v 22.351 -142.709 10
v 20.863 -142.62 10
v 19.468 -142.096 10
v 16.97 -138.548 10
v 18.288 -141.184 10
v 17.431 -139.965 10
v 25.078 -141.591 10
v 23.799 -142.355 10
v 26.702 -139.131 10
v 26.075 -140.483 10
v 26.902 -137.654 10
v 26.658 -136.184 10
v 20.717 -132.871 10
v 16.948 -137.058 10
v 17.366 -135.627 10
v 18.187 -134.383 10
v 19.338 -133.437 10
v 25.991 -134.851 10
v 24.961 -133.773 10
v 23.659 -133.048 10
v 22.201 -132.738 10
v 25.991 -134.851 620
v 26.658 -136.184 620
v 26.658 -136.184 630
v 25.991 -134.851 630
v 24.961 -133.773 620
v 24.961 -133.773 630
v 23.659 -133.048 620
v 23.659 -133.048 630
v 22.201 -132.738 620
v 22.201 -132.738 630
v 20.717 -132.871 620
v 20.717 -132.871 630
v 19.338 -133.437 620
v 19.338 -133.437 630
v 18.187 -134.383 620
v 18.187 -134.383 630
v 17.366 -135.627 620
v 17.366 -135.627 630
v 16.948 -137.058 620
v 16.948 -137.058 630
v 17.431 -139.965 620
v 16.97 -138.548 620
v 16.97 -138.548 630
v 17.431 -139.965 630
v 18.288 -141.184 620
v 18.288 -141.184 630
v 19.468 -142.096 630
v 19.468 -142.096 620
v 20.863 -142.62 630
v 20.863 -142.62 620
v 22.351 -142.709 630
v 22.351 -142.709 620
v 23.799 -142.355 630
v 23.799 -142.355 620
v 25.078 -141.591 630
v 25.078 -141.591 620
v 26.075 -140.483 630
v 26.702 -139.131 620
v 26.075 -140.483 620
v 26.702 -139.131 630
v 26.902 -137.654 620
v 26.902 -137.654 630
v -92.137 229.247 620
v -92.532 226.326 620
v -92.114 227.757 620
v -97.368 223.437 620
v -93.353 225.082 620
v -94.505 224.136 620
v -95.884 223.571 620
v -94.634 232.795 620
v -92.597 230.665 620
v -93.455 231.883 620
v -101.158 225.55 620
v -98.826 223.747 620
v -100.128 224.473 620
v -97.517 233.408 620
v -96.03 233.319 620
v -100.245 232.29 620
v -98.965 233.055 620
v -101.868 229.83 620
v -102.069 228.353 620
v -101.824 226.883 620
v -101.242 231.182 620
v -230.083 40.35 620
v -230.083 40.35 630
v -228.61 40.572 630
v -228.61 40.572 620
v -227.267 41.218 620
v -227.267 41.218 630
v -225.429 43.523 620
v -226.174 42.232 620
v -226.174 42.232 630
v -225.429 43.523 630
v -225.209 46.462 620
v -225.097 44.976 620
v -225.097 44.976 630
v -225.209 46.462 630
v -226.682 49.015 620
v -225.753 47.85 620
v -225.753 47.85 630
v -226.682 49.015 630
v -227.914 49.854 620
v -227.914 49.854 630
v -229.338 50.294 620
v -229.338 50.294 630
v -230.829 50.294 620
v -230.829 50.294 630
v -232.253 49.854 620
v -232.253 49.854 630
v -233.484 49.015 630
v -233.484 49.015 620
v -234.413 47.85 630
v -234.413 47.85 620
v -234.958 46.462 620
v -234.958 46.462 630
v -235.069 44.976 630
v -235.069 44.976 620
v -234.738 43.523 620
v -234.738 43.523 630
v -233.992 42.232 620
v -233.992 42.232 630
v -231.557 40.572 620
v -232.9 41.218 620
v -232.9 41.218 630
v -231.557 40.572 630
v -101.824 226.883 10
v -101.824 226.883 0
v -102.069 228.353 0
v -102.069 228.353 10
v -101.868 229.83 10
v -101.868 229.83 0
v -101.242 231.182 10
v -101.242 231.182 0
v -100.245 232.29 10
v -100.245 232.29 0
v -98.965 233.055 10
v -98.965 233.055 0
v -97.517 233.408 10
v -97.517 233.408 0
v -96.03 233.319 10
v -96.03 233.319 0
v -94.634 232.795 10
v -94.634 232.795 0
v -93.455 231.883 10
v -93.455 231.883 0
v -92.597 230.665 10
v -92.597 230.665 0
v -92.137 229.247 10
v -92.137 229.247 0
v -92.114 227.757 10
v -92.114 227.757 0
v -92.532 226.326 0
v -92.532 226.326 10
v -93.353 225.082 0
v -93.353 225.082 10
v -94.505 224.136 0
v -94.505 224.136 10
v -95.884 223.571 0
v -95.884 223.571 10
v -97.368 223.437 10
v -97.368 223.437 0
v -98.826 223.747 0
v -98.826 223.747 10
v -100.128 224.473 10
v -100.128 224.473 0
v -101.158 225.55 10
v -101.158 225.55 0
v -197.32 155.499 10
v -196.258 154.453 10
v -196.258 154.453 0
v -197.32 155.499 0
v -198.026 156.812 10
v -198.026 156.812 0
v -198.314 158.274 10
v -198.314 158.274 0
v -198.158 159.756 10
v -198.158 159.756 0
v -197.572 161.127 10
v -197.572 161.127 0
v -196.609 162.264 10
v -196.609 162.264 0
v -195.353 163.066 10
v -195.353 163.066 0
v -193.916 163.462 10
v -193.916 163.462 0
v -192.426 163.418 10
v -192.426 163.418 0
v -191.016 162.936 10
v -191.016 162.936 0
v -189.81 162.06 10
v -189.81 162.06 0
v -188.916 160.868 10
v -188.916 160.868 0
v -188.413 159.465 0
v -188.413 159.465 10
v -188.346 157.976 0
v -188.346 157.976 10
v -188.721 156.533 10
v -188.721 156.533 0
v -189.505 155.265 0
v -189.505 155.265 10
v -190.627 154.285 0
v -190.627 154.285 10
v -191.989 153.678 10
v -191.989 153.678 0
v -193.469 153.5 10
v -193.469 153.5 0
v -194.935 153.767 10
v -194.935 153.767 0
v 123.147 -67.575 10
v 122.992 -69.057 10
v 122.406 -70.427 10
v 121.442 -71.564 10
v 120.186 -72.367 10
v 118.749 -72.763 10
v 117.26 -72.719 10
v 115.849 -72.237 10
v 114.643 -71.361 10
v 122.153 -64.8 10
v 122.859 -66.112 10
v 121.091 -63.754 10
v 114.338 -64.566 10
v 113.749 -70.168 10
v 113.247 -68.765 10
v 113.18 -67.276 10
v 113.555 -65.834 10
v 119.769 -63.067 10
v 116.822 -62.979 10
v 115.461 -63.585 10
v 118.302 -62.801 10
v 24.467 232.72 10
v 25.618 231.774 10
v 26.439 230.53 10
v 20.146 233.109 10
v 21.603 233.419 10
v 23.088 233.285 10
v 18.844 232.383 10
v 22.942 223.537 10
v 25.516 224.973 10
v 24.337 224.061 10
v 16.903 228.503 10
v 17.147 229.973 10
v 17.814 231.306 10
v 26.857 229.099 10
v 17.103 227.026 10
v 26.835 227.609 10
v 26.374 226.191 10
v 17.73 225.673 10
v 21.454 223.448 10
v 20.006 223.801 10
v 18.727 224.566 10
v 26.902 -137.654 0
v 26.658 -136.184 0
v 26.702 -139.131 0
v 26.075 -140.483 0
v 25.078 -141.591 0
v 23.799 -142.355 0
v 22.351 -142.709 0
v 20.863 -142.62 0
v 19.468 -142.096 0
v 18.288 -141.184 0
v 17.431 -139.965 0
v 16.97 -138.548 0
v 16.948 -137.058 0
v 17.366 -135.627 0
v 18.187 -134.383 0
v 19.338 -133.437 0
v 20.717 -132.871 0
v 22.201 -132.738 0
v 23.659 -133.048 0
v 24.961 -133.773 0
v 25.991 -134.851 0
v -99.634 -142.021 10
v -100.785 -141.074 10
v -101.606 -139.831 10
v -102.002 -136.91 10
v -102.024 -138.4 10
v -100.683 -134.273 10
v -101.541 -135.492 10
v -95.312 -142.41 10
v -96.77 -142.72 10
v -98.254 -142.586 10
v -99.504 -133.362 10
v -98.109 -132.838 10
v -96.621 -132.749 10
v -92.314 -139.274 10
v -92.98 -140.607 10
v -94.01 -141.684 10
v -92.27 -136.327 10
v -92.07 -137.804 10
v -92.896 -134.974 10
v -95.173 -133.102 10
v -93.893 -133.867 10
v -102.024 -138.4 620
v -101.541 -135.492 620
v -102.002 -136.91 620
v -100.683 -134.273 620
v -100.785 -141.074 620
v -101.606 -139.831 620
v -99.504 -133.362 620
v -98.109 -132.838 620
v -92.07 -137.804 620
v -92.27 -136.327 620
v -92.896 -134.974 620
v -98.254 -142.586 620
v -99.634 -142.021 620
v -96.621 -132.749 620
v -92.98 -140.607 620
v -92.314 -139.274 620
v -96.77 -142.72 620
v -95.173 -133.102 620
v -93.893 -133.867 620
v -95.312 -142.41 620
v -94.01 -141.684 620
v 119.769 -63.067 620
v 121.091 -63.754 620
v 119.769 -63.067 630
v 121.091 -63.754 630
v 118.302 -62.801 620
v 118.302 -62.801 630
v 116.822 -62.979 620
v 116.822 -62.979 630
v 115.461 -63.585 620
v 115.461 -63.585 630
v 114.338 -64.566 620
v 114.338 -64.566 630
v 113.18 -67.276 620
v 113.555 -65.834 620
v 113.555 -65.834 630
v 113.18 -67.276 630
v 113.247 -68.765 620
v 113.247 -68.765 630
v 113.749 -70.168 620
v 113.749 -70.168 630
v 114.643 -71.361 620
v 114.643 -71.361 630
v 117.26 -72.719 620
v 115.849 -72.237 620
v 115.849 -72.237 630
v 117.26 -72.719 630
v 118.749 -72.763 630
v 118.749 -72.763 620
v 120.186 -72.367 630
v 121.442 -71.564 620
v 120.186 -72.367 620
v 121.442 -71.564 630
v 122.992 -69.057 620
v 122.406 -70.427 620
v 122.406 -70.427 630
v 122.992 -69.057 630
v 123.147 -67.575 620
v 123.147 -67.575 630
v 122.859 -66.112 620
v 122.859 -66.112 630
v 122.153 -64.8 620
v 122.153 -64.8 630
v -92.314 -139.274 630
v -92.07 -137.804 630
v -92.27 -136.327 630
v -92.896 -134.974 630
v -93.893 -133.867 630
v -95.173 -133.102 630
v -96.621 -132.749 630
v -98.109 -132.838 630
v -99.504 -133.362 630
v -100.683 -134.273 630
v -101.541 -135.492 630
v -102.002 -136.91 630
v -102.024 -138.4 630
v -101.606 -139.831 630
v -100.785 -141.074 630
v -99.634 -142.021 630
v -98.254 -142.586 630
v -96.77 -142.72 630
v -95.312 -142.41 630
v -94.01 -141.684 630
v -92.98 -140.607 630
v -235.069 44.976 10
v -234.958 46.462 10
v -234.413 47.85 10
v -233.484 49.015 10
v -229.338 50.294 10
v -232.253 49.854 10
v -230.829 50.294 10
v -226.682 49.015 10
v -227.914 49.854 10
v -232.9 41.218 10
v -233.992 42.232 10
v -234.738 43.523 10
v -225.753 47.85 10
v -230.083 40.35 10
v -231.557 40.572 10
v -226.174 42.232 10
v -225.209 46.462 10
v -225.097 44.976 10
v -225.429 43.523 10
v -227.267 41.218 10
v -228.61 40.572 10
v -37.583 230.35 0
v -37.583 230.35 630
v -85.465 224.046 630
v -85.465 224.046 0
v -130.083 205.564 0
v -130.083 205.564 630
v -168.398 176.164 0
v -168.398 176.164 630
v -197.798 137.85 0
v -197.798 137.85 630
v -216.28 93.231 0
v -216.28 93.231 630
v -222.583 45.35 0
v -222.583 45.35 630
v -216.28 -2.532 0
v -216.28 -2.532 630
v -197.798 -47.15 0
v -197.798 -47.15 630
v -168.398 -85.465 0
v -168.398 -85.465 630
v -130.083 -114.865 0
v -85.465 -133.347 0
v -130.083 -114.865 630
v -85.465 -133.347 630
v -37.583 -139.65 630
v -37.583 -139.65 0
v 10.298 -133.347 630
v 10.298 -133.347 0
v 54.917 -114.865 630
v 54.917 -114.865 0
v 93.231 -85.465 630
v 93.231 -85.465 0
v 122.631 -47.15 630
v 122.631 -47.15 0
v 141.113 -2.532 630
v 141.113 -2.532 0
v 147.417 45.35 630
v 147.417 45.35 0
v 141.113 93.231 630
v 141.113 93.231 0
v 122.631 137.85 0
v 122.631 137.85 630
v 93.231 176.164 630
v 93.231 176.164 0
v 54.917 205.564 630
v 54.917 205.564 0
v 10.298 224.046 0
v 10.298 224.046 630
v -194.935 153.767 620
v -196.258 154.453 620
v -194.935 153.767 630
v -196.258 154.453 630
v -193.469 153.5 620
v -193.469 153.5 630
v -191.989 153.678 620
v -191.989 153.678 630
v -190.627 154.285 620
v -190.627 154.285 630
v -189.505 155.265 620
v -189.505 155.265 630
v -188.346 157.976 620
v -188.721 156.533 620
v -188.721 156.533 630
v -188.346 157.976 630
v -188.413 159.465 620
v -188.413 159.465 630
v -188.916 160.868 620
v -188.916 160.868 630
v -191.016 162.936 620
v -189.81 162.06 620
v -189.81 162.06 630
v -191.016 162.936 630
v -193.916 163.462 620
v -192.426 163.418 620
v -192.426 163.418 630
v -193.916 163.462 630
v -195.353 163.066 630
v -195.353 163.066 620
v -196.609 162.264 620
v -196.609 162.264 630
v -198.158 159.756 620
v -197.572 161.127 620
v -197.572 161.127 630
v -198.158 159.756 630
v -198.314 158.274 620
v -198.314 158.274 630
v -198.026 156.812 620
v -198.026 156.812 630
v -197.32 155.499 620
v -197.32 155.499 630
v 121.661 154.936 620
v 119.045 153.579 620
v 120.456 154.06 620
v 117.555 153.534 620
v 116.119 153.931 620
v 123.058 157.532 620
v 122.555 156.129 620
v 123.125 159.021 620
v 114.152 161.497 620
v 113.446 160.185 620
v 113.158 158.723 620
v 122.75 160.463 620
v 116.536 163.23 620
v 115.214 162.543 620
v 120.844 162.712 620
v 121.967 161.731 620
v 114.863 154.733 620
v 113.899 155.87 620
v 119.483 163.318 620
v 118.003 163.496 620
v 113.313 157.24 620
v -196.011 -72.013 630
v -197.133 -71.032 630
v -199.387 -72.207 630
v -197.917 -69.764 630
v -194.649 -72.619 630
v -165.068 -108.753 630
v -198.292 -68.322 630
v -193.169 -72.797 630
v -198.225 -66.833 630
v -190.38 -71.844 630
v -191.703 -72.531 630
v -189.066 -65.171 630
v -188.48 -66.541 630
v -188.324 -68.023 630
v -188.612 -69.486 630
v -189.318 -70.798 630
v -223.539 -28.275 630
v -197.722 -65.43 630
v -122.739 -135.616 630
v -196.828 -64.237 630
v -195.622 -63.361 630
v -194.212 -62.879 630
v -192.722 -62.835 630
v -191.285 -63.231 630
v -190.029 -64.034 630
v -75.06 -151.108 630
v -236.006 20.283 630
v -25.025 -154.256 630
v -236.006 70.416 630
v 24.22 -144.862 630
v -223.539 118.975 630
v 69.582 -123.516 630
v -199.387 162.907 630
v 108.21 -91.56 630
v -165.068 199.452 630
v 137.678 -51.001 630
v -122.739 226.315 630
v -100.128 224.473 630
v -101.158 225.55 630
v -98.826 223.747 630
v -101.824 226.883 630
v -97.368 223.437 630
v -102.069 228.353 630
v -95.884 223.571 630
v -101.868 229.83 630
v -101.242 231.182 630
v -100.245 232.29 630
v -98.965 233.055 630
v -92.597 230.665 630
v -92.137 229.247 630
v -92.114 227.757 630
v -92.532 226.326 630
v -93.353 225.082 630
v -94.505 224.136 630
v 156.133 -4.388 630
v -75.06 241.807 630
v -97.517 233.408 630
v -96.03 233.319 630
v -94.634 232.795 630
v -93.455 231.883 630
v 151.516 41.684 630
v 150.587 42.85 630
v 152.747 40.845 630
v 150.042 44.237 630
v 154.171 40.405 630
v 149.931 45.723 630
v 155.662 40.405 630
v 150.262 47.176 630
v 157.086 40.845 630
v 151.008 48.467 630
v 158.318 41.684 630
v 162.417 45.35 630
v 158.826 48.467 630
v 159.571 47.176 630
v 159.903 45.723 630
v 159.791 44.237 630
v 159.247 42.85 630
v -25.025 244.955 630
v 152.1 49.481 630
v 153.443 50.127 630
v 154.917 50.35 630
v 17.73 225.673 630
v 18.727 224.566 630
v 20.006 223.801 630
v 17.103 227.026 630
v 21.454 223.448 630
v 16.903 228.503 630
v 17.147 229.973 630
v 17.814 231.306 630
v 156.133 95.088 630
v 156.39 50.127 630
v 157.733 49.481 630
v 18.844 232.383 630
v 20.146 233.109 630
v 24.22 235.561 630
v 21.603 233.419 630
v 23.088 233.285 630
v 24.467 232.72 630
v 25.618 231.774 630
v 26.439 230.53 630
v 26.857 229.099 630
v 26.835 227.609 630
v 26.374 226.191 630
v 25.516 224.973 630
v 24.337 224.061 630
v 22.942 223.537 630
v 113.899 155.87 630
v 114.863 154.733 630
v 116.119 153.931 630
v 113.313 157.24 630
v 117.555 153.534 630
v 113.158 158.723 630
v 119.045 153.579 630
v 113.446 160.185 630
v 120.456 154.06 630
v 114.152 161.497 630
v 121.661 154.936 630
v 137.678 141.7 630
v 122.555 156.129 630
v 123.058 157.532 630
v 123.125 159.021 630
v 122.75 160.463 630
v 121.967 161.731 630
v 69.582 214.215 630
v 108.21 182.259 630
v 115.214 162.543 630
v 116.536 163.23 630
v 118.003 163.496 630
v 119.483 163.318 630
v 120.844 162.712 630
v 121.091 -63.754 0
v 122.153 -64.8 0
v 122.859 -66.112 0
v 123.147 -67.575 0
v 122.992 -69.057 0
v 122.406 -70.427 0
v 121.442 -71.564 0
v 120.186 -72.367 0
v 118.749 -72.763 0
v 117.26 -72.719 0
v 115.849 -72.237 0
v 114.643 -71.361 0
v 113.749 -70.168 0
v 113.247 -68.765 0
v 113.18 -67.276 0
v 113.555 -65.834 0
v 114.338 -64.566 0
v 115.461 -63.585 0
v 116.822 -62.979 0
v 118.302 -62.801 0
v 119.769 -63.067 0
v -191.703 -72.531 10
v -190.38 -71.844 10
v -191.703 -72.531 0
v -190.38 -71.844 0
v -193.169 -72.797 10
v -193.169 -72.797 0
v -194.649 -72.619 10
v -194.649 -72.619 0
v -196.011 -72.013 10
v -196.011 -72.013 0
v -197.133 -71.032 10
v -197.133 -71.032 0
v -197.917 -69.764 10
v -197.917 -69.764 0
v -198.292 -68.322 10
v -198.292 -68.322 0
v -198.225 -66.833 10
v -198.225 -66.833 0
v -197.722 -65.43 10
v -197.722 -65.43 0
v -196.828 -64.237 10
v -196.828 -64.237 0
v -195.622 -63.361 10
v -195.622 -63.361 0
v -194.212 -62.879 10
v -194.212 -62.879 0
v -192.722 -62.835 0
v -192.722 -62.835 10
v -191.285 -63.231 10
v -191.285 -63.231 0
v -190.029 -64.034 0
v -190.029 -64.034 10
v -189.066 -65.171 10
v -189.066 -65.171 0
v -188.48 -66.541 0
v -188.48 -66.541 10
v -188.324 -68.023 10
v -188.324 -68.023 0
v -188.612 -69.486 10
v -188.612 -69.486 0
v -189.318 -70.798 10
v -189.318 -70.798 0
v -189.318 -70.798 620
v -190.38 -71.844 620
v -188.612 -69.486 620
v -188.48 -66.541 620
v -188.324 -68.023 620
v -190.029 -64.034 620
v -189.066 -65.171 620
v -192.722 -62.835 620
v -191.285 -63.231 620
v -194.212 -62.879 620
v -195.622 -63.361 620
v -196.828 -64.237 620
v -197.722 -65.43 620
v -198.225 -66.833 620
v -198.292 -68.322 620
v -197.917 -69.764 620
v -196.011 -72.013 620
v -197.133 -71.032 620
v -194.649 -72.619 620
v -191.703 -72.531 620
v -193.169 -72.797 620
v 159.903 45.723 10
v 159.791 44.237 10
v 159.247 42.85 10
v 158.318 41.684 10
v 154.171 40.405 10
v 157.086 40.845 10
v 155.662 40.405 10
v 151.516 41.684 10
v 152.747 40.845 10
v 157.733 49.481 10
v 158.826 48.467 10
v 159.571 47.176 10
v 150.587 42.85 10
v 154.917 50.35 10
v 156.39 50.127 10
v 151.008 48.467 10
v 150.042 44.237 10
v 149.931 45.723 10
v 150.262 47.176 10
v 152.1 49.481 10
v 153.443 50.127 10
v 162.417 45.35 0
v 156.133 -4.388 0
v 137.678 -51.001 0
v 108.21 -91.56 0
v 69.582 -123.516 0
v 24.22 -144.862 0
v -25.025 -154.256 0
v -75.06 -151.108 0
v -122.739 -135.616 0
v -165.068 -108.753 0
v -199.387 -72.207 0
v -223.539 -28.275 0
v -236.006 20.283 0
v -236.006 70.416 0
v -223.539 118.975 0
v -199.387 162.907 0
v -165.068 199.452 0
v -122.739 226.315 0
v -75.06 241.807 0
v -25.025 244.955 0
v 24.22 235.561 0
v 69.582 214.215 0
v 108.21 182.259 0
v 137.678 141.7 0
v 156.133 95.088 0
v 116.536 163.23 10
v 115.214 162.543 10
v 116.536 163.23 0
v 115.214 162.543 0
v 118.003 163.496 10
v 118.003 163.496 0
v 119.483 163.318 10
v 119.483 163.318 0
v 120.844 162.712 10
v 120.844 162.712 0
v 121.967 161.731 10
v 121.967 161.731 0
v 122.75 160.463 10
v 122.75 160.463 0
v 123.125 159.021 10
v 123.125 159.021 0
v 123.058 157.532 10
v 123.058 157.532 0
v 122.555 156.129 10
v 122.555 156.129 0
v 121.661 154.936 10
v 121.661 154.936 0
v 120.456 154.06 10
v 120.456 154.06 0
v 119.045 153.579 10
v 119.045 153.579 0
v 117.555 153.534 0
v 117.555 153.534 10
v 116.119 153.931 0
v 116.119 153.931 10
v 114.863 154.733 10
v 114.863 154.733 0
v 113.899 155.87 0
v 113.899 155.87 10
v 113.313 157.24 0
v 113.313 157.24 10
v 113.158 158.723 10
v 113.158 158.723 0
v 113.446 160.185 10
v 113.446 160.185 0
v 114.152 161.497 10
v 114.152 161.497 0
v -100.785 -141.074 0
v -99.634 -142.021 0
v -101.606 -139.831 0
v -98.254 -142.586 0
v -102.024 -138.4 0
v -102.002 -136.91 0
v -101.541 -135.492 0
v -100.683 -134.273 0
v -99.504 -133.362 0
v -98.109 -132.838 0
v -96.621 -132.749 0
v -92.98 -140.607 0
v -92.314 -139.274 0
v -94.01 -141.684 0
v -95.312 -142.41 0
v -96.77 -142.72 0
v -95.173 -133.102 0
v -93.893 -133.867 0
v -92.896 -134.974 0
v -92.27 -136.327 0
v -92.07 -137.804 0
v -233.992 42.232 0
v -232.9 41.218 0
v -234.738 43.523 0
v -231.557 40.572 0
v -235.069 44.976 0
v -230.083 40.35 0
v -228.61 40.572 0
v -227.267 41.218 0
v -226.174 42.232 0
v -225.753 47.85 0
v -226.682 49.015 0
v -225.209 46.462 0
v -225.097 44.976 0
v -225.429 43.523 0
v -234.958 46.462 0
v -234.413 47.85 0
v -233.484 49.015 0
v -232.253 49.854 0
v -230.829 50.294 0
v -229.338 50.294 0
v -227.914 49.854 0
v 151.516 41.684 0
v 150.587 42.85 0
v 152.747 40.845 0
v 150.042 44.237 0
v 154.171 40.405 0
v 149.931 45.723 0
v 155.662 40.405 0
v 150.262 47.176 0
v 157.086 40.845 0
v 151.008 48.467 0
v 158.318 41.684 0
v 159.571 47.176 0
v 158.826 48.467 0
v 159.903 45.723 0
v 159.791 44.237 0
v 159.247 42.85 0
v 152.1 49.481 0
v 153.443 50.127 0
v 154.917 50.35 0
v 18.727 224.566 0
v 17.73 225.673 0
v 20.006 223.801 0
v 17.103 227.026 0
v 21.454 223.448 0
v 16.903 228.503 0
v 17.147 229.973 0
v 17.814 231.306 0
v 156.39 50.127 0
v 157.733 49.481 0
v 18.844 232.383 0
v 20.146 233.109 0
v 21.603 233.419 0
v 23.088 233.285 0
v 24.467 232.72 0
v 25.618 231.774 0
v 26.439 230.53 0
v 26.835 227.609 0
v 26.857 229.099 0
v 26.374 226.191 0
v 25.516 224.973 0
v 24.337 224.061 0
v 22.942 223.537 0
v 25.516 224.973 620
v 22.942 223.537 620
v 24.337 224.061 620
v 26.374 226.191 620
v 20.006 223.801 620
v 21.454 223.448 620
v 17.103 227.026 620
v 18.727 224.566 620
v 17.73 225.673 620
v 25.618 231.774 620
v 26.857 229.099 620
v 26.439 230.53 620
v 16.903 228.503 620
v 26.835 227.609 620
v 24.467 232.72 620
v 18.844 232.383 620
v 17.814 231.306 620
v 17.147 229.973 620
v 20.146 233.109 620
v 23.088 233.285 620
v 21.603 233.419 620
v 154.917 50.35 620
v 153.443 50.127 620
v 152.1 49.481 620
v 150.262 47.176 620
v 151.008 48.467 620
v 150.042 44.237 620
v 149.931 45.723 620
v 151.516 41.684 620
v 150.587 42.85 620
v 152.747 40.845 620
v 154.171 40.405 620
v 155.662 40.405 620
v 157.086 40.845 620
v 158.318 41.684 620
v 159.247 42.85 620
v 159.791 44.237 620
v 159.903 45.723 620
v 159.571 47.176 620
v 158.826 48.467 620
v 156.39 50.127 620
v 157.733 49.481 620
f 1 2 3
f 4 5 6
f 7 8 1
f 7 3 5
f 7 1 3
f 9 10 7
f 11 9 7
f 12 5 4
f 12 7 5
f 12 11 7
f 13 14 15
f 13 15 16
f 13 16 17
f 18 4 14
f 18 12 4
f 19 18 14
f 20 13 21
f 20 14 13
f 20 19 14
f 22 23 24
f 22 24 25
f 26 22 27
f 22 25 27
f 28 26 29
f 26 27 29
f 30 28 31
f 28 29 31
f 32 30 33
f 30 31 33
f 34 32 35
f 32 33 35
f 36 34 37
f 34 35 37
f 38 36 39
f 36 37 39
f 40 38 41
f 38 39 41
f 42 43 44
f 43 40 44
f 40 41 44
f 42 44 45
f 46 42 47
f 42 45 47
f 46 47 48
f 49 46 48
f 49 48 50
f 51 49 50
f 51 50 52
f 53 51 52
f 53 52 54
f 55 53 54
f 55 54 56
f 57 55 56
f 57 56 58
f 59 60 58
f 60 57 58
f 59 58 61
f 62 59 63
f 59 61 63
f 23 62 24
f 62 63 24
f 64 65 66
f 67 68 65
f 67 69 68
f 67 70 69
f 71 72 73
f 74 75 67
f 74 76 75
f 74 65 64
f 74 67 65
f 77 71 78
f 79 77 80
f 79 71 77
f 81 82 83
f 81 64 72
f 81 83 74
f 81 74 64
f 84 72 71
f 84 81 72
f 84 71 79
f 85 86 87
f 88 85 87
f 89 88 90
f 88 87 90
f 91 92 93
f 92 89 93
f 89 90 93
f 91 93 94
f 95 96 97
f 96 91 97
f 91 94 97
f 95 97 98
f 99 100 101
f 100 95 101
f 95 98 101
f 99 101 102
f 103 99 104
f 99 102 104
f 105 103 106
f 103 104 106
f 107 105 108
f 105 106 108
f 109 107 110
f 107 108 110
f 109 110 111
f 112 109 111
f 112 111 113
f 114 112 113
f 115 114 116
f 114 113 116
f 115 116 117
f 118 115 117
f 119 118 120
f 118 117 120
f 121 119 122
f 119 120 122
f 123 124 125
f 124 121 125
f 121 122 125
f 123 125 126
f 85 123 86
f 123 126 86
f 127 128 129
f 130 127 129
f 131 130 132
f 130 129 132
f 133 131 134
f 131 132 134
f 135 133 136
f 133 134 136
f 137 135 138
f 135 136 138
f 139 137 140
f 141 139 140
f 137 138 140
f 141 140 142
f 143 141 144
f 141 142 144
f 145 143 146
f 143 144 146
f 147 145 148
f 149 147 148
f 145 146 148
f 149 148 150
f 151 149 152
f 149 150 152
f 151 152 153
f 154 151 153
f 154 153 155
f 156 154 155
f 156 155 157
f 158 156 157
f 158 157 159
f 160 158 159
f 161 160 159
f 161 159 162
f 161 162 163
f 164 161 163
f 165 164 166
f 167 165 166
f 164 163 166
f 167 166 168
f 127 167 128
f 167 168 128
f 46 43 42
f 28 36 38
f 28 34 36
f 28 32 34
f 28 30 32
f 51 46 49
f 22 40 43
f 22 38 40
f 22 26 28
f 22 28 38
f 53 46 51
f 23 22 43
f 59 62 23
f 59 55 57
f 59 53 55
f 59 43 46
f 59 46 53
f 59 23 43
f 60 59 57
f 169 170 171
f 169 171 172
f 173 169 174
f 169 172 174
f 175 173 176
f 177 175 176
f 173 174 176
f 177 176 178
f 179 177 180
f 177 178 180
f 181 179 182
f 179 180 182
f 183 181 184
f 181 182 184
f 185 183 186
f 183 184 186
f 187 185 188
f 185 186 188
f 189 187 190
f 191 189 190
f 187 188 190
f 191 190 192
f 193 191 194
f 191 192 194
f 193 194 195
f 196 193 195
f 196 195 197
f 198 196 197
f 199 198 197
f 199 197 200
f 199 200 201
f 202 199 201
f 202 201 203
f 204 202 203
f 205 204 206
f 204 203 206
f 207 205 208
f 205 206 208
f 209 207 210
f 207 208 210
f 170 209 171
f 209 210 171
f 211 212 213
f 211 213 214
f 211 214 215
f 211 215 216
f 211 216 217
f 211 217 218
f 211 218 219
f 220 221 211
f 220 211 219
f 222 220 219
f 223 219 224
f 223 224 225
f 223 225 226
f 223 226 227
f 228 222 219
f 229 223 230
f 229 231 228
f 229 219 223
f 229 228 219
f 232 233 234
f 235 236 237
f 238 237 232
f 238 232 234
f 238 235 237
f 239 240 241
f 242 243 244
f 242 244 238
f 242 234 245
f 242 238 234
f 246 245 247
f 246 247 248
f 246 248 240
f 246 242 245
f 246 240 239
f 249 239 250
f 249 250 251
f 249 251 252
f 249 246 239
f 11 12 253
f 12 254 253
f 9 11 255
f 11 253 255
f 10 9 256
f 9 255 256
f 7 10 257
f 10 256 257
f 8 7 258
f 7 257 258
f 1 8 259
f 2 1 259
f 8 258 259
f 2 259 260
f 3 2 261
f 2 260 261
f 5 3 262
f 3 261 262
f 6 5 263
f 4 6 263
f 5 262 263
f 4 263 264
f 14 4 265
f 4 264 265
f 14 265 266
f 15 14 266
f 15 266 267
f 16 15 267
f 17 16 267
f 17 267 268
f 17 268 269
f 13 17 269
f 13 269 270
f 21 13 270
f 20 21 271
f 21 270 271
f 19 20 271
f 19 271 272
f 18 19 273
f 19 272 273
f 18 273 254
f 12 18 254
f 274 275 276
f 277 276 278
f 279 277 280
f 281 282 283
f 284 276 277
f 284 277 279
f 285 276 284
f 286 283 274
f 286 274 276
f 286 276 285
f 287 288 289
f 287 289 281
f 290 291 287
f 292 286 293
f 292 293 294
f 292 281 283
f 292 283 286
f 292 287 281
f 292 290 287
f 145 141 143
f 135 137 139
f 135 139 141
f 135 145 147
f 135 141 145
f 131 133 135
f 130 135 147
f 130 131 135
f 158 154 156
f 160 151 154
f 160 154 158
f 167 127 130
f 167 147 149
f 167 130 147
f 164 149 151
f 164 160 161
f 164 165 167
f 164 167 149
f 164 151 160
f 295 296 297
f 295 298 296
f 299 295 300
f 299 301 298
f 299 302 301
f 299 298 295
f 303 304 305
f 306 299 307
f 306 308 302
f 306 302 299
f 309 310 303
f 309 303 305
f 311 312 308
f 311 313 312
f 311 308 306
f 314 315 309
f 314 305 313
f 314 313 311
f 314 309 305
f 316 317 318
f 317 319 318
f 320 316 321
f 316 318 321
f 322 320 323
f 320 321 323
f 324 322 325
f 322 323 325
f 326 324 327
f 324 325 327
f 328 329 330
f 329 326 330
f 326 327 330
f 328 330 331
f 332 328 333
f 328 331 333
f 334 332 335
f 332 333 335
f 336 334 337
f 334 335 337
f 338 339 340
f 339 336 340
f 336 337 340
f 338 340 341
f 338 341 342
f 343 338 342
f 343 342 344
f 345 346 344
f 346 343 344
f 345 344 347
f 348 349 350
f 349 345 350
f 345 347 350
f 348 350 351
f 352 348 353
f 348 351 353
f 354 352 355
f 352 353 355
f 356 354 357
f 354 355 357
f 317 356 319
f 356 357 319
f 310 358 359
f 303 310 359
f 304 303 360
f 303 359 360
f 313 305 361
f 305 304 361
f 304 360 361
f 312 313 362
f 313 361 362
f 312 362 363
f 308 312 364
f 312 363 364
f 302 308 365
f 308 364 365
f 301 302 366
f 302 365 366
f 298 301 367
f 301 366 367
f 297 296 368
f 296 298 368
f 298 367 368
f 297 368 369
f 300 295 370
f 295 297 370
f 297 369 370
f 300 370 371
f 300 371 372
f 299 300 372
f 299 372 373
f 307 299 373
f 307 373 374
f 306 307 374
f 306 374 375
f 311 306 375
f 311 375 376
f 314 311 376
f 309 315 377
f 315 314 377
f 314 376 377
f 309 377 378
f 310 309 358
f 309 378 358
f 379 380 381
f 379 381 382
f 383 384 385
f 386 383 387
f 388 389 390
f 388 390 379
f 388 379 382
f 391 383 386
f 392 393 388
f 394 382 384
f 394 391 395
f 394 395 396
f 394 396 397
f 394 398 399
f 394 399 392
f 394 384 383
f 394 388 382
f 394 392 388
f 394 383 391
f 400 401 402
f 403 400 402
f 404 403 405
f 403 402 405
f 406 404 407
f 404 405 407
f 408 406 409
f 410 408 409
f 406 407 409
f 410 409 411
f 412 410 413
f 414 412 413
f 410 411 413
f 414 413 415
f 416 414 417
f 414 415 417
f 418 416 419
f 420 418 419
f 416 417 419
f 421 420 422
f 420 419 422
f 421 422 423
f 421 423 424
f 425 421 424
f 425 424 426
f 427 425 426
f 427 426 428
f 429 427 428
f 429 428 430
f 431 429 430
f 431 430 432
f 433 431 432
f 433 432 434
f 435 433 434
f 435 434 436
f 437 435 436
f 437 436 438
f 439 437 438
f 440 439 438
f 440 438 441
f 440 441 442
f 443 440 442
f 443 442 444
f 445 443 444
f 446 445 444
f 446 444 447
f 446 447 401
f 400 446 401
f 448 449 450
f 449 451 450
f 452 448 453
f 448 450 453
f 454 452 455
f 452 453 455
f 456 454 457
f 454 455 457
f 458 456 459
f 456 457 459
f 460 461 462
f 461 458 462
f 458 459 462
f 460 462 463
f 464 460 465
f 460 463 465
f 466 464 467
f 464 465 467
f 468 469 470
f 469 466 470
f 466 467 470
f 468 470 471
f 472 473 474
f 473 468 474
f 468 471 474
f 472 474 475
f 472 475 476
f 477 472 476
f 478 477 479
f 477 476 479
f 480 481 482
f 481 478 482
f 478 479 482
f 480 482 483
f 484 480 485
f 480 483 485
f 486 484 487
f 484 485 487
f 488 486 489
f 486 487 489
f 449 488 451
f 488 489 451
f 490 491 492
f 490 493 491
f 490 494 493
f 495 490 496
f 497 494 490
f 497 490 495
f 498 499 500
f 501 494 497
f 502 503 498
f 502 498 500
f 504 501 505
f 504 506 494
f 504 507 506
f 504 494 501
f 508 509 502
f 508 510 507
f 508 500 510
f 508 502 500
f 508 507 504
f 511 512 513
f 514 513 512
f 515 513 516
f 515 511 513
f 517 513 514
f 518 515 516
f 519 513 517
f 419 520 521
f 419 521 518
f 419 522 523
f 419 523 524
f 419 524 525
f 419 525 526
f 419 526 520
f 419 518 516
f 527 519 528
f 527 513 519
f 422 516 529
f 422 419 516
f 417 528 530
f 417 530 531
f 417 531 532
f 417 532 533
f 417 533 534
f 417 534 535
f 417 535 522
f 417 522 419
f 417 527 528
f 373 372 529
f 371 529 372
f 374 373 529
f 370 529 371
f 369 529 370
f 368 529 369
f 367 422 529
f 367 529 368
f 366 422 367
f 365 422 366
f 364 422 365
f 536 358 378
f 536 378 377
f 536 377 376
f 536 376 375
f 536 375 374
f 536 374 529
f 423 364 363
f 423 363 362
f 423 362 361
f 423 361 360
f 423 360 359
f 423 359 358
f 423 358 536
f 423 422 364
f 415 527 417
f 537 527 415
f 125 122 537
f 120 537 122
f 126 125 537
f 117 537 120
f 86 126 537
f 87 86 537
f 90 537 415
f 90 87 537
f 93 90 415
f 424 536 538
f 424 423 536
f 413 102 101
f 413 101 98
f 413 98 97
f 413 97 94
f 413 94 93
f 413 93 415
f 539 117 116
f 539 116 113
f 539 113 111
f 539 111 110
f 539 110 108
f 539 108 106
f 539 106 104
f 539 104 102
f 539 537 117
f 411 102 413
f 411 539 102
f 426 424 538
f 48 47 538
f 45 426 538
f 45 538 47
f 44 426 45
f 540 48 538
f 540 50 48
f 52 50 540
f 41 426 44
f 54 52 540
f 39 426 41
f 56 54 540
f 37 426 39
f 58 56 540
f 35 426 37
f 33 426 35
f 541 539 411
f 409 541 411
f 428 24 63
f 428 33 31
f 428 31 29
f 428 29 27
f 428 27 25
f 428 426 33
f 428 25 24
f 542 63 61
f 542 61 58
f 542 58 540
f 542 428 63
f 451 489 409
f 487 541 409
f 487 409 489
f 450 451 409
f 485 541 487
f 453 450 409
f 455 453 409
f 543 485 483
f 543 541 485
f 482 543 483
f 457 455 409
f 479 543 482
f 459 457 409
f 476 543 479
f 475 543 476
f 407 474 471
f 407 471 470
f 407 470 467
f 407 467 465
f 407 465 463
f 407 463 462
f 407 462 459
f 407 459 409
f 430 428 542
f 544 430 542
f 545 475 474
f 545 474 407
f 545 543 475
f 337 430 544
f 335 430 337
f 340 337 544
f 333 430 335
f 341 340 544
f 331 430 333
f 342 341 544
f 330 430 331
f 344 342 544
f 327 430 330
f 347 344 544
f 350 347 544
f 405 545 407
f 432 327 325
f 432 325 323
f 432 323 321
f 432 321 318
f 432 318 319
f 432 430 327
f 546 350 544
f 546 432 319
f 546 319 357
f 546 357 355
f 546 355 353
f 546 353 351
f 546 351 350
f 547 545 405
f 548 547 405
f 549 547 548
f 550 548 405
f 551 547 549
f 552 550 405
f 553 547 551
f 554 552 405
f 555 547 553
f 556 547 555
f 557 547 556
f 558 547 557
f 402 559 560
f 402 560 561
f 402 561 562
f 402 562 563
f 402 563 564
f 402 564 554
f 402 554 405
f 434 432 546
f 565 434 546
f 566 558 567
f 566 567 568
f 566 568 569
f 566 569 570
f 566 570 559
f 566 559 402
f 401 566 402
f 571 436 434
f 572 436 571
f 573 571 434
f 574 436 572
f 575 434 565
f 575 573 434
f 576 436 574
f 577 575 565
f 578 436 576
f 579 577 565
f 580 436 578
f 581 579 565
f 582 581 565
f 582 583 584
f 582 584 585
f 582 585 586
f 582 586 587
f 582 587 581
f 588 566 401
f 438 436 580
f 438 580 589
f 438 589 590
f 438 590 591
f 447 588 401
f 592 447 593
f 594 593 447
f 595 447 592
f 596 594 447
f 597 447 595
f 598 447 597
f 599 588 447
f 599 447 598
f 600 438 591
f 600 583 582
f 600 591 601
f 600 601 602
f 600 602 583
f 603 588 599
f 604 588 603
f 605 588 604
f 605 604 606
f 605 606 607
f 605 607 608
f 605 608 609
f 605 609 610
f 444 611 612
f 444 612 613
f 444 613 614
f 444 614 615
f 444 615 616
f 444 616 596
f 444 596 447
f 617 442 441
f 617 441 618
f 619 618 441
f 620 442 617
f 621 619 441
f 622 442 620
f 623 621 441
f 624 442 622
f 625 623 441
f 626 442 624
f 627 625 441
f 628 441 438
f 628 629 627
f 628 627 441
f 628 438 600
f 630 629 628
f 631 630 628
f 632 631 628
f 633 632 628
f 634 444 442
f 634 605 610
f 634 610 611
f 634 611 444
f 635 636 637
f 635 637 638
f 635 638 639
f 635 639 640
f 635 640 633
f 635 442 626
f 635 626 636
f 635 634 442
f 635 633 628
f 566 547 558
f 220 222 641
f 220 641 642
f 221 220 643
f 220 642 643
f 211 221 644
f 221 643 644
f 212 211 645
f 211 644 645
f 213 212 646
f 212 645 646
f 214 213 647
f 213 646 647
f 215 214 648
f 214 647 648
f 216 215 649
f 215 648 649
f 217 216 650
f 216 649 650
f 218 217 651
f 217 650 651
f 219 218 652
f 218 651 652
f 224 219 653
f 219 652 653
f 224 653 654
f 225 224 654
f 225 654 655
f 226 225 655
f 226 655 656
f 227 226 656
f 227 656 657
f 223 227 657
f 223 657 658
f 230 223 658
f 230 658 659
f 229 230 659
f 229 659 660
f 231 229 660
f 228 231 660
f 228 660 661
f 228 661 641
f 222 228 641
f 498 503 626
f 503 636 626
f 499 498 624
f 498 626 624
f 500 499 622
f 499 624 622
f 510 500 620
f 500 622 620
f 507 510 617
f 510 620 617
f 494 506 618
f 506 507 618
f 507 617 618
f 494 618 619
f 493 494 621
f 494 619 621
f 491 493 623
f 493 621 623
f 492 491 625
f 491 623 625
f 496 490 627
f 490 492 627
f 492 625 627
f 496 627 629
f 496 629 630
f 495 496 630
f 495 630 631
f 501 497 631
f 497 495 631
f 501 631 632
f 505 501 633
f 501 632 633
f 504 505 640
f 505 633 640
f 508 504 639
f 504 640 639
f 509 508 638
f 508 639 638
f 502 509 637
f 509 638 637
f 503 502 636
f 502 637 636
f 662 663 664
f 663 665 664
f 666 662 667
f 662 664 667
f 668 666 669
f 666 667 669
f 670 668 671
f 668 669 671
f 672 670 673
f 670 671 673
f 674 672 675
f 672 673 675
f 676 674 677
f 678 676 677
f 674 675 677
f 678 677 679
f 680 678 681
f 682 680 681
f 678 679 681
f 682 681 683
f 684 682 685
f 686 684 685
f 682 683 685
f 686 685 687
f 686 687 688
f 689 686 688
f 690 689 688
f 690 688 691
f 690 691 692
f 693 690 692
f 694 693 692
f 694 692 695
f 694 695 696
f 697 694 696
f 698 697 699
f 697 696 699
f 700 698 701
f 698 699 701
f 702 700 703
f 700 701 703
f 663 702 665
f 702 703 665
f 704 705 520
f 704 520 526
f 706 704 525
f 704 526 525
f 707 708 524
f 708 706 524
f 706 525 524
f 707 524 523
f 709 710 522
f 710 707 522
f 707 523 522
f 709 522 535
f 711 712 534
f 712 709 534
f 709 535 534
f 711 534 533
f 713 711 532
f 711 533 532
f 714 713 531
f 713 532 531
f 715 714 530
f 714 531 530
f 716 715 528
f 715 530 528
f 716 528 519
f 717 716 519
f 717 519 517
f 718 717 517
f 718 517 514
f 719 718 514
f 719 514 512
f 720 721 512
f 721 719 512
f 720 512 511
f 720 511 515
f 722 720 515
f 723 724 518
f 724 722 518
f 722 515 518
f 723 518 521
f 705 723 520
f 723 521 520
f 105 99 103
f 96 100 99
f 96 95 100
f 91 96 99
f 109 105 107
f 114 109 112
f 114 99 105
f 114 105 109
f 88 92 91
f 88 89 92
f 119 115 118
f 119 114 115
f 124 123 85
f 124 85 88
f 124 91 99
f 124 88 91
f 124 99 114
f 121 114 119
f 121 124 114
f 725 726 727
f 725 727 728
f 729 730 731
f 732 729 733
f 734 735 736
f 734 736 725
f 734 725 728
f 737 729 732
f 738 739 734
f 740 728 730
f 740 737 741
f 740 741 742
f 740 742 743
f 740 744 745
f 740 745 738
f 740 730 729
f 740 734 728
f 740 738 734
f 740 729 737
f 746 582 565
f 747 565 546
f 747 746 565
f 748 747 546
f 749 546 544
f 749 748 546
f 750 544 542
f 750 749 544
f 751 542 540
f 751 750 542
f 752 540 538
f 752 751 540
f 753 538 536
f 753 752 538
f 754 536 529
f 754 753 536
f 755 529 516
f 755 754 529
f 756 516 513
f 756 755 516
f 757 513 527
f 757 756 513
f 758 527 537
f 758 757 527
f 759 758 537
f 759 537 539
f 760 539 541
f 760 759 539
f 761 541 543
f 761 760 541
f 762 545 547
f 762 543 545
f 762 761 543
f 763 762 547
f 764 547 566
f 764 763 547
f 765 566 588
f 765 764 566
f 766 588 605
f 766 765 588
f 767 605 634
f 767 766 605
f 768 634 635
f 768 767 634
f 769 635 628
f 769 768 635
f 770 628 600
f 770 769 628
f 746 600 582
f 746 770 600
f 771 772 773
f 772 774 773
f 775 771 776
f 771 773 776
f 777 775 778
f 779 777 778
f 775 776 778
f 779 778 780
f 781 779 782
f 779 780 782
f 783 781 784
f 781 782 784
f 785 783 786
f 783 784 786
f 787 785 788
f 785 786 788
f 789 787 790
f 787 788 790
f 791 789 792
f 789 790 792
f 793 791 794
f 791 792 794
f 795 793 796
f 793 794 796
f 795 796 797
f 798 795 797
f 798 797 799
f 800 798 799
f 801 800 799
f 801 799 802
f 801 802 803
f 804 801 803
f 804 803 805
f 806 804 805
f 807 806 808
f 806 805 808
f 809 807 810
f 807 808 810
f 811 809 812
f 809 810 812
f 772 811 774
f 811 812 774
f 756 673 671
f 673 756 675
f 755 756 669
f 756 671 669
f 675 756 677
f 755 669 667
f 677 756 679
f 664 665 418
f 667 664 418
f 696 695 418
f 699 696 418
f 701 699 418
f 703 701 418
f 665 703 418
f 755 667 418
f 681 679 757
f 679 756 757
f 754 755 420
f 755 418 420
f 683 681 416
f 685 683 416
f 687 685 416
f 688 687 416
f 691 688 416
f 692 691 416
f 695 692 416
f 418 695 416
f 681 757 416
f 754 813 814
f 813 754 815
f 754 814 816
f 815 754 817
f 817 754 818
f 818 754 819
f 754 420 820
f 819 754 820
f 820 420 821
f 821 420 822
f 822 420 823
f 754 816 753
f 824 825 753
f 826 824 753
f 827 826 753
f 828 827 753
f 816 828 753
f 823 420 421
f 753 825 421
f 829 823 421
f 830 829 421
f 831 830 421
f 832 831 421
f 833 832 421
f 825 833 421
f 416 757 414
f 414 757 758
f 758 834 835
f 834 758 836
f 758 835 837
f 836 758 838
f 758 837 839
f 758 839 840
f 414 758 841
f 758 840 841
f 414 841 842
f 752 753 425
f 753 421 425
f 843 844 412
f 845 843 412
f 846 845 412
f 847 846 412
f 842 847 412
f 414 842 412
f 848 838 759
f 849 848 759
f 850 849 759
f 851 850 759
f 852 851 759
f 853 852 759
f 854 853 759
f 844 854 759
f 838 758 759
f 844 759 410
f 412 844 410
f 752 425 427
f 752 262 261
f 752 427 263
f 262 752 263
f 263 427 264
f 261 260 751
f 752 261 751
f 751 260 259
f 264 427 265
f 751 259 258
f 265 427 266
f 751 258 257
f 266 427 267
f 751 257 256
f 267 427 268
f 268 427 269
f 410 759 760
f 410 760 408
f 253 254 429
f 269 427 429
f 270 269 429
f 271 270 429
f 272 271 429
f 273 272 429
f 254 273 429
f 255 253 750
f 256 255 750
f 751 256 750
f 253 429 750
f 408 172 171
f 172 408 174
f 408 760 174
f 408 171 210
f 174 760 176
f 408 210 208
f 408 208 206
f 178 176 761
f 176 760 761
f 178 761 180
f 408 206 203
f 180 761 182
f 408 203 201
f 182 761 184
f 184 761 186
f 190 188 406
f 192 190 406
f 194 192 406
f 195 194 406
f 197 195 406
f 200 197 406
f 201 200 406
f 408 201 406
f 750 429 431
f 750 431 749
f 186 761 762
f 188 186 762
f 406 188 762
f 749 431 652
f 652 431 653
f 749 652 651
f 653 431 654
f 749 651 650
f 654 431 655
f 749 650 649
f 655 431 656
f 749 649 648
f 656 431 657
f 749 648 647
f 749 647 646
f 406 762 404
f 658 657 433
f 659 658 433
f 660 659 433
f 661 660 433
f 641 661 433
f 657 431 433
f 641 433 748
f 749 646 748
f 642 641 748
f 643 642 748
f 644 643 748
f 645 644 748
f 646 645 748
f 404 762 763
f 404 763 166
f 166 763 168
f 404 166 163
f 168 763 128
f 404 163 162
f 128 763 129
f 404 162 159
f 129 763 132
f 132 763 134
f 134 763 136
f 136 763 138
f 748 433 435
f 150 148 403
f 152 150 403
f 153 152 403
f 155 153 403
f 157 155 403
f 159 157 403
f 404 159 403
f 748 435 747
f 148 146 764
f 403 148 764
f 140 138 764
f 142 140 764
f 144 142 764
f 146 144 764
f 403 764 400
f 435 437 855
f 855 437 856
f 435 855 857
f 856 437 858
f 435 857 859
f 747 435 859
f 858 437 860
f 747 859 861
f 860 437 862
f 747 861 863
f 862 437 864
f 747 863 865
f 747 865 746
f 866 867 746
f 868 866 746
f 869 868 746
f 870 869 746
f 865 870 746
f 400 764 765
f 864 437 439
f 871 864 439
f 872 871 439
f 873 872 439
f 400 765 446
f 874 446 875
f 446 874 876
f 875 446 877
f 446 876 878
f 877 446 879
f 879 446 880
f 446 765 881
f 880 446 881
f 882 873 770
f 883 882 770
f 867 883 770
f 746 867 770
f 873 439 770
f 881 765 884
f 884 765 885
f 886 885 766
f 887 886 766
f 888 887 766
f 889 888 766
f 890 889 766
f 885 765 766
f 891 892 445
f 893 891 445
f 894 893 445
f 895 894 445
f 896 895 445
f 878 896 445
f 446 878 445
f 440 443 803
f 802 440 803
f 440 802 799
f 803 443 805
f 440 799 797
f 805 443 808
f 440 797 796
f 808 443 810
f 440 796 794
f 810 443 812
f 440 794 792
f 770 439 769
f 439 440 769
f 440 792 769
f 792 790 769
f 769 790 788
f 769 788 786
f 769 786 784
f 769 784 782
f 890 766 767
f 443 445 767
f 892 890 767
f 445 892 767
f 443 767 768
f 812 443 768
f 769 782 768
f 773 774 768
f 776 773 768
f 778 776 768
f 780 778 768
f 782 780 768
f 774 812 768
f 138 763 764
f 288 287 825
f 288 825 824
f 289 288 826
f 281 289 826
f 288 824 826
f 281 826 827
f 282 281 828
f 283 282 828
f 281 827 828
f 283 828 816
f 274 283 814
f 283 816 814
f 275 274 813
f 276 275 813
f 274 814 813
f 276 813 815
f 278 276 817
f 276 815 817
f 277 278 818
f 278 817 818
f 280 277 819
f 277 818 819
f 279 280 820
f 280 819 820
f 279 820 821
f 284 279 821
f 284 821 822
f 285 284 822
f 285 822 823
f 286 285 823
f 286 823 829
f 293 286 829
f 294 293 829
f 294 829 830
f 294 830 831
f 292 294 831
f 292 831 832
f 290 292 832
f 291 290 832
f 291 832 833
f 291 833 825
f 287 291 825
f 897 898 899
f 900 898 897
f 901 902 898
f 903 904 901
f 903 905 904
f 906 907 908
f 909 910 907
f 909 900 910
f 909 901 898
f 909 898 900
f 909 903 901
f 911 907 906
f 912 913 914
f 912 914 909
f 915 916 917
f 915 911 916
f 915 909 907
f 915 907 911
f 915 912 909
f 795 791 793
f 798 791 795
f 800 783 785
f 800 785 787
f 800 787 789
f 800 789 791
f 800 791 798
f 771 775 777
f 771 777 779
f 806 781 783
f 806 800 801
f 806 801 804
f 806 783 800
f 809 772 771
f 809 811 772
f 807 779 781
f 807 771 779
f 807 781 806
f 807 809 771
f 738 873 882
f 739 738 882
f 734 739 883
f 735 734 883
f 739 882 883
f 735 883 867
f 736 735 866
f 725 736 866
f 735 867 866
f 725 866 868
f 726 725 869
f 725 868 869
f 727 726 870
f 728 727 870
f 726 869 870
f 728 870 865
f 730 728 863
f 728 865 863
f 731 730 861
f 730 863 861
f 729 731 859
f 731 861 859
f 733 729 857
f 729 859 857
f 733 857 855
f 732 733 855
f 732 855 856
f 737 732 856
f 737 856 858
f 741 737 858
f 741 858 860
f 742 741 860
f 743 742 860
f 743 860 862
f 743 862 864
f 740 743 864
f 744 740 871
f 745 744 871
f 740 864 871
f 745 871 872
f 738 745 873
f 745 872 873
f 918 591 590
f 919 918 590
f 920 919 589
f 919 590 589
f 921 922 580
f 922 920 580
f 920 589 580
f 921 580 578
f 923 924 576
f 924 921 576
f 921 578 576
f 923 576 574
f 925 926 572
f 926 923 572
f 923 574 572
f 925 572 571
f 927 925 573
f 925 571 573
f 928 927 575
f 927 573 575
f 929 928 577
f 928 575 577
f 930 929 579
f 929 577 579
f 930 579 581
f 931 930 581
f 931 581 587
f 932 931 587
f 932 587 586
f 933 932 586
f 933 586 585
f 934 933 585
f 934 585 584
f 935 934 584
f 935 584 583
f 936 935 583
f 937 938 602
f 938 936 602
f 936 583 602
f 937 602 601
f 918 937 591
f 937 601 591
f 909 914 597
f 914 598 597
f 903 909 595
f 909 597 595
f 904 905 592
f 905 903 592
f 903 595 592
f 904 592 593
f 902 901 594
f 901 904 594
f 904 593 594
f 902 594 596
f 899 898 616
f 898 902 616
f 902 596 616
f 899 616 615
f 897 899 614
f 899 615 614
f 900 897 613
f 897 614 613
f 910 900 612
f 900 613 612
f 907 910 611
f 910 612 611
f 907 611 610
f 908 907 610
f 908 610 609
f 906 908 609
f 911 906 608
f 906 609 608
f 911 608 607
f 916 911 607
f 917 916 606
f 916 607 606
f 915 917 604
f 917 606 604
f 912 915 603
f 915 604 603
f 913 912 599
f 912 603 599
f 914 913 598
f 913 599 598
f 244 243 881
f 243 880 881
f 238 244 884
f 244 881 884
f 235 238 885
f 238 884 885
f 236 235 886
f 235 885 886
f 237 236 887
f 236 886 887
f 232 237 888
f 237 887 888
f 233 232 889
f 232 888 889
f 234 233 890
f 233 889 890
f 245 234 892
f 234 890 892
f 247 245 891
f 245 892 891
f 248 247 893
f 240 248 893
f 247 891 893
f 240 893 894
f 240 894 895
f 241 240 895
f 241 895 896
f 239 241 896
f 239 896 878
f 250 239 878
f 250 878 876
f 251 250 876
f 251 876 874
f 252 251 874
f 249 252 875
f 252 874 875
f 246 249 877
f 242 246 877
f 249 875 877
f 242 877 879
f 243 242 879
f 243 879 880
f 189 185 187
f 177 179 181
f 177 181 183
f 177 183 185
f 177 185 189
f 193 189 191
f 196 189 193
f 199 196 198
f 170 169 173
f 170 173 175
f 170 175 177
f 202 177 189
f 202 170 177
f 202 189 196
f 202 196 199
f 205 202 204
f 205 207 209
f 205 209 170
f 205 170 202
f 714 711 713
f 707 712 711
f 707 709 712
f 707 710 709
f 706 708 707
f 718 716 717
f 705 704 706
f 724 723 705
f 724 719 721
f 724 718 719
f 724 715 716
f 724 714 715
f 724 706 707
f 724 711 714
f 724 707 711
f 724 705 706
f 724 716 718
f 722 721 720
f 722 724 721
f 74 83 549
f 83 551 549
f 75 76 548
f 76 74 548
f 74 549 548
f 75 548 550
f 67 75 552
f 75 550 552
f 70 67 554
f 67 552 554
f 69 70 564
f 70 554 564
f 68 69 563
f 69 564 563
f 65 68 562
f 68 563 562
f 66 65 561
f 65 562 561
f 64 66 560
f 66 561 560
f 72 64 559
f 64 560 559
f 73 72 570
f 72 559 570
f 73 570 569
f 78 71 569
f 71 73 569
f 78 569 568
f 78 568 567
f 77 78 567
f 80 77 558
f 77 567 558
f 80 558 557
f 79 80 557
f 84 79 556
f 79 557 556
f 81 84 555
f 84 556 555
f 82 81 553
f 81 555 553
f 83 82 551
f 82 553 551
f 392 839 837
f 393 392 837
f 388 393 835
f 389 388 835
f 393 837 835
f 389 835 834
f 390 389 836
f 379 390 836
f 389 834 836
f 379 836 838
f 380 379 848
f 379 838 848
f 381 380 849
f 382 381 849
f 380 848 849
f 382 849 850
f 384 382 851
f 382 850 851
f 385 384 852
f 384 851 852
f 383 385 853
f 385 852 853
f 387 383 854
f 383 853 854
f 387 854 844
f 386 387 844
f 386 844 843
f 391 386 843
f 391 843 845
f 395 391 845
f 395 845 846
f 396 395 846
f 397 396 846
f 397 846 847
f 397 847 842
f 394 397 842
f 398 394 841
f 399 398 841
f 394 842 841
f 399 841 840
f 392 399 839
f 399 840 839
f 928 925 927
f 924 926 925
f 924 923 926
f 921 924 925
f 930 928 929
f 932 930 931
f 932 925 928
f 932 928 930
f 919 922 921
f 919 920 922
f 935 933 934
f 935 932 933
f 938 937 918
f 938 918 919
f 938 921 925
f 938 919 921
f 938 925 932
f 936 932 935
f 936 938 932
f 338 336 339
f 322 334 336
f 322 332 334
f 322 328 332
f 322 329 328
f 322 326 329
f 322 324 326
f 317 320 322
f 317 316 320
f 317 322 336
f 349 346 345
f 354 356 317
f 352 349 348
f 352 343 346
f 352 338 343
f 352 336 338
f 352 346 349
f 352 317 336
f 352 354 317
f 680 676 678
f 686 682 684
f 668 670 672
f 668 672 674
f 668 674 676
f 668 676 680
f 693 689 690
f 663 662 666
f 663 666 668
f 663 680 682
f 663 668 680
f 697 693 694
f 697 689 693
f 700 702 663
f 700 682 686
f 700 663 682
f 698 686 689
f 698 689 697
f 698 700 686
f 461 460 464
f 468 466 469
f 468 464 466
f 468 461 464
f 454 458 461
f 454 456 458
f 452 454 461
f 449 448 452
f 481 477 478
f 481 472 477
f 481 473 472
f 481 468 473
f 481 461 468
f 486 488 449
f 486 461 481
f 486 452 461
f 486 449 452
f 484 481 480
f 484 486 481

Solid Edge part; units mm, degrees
sketch "Sketch1" plane through (0, 0, 0) normal (0, 0, 1) x (1, 0, 0)
  circle A0 centre (-37.5833, 45.3496) radius 200
extrude "Protrusion1" add sketch "Sketch1" along normal blind 630
sketch "Sketch2" plane through (-37.5833, 45.3496, -30) normal (0, 0, -1) x (0, -1, 0)
  circle A0 centre (0, 0) radius 25
  dimension "D1" = 50
extrude "Cutout1" cut sketch "Sketch2" against normal through all
sketch "Sketch3" plane through (-37.5833, 45.3496, 630) normal (0, 0, 1) x (0, 1, 0)
  circle A0 centre (0, 0) radius 185
  dimension "D1" = 370
extrude "Cutout2" cut sketch "Sketch3" against normal through all
sketch "Sketch4" plane through (-37.5833, 45.3496, 0) normal (0, 0, -1) x (0, 1, 0)
  circle A0 centre (0, 192.5) radius 5
  dimension "D1" = 10
  dimension "D2" = 7.5
extrude "ExtrudedCutout_4" cut sketch "Sketch4" against normal blind 10
pattern_circular "Pattern1" count 10 over 360 about axis through (-37.5833, 45.3496, 0) along (0, 0, 1) of "ExtrudedCutout_4"
mirror "Mirror1" about plane through (-37.5833, 45.3496, 315) normal (0, 0, 1) of "ExtrudedCutout_4", "Pattern1"
properties material "Aluminum, 6061-T6"
